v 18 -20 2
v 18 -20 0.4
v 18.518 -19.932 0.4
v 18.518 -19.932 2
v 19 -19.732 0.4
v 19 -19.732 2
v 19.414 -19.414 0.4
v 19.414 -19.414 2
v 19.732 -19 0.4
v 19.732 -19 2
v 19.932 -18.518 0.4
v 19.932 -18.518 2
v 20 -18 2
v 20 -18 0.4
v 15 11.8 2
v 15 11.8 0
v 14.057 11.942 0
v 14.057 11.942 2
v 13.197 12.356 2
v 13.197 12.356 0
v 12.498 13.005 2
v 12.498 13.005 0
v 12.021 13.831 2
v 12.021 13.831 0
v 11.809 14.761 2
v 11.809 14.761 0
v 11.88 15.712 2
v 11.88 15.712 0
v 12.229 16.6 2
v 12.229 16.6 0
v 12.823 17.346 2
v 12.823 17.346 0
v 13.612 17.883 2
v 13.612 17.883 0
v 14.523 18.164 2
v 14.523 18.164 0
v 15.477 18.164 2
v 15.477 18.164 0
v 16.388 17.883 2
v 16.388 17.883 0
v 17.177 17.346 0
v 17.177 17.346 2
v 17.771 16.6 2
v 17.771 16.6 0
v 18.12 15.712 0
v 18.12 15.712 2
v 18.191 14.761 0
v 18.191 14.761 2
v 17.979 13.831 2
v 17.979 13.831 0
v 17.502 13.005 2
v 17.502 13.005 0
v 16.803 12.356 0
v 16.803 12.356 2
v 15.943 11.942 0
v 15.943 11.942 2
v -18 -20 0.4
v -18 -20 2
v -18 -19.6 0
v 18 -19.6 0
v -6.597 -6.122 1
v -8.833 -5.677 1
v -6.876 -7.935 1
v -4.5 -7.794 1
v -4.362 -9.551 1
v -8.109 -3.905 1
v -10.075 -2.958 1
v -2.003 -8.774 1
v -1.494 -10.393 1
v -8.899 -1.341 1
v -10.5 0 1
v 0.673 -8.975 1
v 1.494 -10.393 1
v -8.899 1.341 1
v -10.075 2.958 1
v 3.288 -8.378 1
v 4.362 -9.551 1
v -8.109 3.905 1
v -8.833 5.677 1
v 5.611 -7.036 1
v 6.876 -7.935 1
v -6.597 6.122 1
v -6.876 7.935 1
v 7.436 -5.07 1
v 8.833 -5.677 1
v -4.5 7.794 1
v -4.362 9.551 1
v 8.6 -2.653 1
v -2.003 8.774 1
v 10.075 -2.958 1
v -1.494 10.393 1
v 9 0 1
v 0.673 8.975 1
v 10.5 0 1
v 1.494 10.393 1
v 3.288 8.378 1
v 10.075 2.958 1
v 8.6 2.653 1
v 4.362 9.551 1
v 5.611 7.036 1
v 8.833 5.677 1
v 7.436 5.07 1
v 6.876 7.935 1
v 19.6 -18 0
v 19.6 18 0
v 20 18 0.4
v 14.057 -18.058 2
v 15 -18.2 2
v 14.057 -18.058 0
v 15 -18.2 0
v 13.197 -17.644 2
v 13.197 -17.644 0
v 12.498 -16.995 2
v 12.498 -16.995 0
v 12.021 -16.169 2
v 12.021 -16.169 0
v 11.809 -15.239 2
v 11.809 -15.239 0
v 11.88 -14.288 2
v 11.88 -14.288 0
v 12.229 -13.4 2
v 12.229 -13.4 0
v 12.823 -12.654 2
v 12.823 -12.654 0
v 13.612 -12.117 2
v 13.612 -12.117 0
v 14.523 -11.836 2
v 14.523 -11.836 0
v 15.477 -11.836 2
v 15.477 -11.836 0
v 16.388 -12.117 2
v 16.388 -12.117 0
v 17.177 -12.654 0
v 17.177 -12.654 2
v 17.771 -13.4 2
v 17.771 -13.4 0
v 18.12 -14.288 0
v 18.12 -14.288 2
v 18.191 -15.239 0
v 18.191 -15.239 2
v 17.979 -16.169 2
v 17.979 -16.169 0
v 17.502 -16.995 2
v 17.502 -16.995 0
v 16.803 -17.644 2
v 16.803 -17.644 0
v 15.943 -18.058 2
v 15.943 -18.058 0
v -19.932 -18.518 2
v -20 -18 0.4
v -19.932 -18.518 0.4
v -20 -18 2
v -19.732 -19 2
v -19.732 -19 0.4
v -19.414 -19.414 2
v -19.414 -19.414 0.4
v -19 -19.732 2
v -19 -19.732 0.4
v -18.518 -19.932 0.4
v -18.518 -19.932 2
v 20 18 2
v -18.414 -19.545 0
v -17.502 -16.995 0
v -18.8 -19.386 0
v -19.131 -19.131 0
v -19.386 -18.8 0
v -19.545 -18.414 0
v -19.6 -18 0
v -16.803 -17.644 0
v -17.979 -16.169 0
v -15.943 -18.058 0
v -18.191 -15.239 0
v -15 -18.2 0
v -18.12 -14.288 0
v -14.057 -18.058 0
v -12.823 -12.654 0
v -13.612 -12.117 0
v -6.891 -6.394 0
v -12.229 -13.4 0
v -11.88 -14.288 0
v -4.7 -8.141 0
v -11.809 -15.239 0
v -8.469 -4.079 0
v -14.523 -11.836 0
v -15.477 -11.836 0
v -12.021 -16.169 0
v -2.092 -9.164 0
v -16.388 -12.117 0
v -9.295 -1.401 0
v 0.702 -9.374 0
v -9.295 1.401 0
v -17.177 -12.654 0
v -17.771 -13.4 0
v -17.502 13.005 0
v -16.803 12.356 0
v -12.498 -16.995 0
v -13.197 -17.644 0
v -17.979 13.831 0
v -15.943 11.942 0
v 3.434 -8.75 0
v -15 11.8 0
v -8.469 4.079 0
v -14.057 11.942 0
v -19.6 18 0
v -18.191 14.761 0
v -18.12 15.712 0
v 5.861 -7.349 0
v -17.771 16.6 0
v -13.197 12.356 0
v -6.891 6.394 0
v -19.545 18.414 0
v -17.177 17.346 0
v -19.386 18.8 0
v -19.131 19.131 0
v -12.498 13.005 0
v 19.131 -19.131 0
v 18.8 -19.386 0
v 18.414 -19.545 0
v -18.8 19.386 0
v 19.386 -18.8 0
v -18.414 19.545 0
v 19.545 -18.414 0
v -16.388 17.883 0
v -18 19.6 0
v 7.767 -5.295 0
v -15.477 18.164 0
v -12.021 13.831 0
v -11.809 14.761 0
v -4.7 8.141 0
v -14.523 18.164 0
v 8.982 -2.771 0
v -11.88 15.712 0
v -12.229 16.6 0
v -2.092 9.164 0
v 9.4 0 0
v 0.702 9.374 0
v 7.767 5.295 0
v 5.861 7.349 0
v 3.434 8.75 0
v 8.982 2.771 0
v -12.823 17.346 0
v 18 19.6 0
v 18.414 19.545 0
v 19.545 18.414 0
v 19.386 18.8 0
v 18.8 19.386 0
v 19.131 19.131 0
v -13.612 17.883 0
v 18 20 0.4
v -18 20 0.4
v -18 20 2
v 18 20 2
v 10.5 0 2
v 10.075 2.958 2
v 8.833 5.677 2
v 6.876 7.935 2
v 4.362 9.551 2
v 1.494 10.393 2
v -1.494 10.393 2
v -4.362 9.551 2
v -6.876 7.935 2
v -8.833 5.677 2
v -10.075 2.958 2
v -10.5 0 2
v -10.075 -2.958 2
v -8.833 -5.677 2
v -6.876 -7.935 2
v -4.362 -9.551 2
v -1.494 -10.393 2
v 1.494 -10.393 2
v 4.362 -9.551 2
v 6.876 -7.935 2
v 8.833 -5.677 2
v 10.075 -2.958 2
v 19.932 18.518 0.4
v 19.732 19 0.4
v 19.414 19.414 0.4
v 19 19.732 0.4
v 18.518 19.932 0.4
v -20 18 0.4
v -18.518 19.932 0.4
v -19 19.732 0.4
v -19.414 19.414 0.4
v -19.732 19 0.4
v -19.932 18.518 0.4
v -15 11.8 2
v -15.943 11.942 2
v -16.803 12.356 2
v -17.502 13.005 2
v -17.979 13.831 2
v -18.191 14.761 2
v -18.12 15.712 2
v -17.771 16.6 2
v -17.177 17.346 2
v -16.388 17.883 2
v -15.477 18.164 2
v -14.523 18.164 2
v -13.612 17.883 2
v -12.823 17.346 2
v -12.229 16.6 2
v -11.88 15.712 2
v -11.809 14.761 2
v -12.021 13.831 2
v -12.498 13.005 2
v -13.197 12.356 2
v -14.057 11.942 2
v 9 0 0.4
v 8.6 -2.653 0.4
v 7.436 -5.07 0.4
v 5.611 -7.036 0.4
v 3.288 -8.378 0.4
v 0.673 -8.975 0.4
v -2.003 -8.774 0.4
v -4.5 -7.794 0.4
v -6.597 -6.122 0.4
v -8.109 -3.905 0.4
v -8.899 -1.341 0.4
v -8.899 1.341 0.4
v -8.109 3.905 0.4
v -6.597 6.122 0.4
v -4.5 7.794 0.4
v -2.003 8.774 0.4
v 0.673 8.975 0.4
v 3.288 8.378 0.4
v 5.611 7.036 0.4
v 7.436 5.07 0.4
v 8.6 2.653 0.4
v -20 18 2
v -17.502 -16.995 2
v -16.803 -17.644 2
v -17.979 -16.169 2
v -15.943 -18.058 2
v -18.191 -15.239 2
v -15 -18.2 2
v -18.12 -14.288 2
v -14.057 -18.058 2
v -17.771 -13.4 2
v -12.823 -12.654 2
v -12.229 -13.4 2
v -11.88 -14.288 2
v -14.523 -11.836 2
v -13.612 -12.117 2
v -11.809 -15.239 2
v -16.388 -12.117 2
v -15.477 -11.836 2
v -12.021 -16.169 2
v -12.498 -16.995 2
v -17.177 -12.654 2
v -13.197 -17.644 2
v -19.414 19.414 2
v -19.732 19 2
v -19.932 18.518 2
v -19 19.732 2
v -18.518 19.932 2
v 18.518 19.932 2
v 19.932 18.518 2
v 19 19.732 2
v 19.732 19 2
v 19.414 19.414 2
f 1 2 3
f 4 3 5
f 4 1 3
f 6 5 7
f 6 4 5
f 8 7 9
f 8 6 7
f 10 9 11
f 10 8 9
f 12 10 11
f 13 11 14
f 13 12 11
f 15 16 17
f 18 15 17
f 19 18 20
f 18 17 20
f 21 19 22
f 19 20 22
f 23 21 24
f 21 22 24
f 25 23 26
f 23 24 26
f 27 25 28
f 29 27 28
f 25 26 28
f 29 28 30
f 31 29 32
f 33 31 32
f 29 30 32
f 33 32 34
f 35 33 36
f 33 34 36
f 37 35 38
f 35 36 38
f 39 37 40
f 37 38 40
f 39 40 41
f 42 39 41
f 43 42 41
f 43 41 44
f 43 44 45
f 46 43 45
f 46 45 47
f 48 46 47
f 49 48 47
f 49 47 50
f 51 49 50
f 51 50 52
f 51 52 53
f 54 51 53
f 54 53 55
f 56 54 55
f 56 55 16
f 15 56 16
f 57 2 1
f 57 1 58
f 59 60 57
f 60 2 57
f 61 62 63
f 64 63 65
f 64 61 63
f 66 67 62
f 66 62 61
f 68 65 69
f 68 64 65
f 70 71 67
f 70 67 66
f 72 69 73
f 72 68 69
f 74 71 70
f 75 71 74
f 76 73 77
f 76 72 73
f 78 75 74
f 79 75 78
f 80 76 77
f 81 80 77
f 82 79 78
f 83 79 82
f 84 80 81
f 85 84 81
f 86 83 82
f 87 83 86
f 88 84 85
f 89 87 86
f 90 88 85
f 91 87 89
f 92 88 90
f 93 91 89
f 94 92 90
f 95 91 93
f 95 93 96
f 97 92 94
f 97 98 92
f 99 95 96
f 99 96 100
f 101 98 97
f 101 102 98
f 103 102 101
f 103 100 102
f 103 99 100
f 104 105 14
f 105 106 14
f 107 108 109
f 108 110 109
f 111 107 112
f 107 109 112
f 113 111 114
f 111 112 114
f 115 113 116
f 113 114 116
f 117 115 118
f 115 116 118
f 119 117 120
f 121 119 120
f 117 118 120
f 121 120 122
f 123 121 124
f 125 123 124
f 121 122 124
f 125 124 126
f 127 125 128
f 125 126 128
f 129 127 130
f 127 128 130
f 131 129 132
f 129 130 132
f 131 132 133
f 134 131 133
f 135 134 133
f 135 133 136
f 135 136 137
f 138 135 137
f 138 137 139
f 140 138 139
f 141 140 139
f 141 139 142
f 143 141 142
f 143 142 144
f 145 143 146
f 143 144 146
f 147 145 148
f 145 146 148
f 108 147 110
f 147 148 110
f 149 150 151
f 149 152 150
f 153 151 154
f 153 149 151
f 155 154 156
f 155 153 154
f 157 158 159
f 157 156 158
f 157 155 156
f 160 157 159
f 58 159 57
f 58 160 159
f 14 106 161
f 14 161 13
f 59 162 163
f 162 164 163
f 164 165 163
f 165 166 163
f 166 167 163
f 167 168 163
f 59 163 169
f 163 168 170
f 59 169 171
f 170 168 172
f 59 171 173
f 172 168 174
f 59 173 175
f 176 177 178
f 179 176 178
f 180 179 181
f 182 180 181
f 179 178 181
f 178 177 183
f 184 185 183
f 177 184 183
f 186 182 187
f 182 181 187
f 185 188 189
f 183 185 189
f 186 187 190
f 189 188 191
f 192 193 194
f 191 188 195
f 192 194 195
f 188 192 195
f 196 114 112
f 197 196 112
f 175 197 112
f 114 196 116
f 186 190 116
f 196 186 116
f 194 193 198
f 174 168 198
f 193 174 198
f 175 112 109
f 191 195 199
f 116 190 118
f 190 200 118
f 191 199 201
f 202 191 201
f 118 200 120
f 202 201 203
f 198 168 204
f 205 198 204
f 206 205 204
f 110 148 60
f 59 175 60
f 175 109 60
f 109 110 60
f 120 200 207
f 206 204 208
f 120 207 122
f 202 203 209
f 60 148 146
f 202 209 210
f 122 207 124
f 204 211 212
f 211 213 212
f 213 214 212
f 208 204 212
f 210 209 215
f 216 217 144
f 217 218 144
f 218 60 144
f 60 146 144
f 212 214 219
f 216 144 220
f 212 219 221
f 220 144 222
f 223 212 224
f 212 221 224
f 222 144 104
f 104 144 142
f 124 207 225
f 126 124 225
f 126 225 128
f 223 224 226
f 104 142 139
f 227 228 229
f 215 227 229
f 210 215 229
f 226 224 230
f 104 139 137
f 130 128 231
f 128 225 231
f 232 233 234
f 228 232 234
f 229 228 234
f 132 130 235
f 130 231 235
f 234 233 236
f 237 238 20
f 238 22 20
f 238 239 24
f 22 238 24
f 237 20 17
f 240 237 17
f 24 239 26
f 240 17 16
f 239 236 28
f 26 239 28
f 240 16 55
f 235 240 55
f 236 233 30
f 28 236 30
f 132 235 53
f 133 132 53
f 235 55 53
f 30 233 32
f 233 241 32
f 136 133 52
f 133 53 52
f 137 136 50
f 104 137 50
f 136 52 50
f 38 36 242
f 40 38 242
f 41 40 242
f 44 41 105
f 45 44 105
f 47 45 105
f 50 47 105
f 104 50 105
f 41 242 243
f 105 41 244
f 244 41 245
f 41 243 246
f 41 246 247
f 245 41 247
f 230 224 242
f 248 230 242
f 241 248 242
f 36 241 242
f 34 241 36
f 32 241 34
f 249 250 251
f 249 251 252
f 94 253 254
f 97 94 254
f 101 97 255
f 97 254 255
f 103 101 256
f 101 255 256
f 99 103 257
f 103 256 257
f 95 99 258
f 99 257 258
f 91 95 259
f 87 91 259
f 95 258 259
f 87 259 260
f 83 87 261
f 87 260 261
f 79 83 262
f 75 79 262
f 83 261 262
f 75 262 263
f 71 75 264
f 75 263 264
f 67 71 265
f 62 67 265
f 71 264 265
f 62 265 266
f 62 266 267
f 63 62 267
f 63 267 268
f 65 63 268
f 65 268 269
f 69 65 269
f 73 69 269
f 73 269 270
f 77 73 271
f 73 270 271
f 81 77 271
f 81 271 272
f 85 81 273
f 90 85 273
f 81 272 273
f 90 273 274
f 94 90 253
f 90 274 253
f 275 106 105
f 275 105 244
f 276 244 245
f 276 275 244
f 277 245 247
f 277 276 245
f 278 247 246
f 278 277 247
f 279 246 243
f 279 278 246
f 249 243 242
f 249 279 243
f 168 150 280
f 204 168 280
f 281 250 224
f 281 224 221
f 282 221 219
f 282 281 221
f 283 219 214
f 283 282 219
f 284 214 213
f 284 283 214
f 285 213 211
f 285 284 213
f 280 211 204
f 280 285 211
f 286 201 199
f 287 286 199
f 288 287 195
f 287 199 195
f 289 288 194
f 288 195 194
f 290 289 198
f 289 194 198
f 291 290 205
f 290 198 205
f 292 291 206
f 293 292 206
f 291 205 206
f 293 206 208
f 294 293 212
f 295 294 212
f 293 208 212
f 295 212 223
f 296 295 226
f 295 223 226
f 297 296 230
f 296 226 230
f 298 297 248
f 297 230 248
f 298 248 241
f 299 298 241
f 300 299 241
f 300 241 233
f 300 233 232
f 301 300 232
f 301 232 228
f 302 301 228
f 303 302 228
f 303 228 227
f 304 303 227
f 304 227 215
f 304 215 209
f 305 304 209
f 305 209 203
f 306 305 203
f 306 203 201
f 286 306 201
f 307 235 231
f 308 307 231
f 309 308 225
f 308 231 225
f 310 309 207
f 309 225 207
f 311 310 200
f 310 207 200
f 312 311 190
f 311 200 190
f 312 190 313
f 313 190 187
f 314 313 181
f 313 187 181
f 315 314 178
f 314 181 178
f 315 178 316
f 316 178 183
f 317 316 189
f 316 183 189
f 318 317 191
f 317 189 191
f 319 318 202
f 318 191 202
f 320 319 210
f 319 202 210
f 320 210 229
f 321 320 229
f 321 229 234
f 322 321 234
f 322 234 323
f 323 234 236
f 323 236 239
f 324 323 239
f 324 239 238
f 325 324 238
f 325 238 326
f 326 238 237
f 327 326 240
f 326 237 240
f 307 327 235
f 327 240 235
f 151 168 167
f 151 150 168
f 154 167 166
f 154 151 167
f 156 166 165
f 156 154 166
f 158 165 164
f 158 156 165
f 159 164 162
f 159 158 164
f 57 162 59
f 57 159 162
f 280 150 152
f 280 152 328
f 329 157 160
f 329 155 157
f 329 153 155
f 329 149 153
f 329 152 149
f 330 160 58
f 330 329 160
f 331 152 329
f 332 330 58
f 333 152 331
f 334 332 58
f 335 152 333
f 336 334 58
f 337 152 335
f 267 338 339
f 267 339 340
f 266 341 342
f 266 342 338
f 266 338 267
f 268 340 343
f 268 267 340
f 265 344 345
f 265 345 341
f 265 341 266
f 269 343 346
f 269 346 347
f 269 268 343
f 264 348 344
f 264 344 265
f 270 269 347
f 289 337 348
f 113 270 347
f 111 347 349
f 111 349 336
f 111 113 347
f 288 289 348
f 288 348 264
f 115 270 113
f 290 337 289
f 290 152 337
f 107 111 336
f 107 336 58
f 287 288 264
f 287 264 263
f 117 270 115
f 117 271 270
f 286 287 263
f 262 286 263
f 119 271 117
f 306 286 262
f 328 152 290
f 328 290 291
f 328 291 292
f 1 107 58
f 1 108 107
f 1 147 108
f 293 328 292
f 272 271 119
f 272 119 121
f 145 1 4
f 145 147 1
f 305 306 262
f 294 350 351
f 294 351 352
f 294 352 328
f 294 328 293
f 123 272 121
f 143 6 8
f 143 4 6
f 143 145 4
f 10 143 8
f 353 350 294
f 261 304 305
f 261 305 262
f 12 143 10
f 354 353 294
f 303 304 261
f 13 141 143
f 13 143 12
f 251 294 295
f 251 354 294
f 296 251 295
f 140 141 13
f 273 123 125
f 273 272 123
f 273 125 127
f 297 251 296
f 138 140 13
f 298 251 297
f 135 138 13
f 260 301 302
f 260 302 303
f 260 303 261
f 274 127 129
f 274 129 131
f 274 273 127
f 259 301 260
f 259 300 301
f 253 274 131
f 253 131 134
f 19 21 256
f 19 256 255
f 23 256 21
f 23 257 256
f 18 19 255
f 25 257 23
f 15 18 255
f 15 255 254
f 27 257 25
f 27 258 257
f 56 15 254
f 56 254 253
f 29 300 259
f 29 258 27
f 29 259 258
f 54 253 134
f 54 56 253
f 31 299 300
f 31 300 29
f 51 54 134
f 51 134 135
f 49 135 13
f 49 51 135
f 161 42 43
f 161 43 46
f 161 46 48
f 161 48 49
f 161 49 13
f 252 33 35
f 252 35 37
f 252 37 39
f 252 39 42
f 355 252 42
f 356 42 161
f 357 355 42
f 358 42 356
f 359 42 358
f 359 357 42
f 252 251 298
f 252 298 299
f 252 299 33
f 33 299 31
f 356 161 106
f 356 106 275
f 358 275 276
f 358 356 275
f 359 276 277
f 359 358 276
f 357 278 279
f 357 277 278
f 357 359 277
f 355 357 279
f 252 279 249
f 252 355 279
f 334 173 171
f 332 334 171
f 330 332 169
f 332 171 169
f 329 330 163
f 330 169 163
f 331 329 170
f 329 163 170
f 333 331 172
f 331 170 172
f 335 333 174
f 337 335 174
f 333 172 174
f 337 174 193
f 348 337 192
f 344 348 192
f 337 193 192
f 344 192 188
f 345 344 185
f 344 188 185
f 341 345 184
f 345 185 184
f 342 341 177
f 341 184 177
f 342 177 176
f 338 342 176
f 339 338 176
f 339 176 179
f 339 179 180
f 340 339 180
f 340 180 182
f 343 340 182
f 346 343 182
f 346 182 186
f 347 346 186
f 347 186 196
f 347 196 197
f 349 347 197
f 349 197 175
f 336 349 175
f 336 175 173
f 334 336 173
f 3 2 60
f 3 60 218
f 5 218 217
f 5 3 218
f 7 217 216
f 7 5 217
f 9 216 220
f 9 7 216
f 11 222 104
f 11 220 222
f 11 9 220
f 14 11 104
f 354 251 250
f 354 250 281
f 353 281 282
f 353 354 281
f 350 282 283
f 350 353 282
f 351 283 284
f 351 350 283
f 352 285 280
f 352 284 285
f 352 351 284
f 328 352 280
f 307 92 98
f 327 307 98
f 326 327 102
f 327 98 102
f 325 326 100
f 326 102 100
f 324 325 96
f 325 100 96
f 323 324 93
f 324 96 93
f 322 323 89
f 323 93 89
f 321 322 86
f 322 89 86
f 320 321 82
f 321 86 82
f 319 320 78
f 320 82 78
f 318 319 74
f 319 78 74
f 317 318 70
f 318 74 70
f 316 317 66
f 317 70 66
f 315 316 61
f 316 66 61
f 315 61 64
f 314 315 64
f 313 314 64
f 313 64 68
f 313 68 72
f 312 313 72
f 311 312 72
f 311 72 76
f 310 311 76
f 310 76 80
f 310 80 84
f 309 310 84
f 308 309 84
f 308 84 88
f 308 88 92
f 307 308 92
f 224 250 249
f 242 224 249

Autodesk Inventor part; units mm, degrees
ref_plane "YZ Plane" through (0, 0, 0) normal (1, 0, 0) x (0, 1, 0)
ref_plane "XZ Plane" through (0, 0, 0) normal (0, 1, 0) x (-1, 0, 0)
ref_plane "XY Plane" through (0, 0, 0) normal (0, 0, 1) x (1, 0, 0)
sketch "Sketch1" plane through (0, 0, 0) normal (0, 0, 1) x (1, 0, 0)
  line L0 (-20, 20) -> (20, 20)
  line L1 (20, 20) -> (20, -20)
  line L2 (20, -20) -> (-20, -20)
  line L3 (-20, -20) -> (-20, 20)
  point P0 (0, 0)
  point P1 (20, 0)
  point P2 (0, 20)
  dimension "d0" = 40
extrude "Extrusion1" add sketch "Sketch1" along normal blind 2
fillet "Fillet1" radius 2 4 edges at (20, 20, 1) (-20, 20, 1) (20, -20, 1) (-20, -20, 1)
sketch "Sketch2" plane through (0, 0, 2) normal (0, 0, 1) x (1, 0, 0)
  line L0 (-15, 15) -> (15, 15) construction
  line L1 (15, 15) -> (15, -15) construction
  line L2 (15, -15) -> (-15, -15) construction
  line L3 (-15, -15) -> (-15, 15) construction
  point P0 (0, 0)
  point P1 (15, 0)
  point P2 (0, 15)
  dimension "d4" = 30
hole "Hole1" at (-15, 15, 2) at (15, 15, 2) at (15, -15, 2) at (-15, -15, 2) direction (0, 0, -1) diameter 6.4 end through all
sketch "Sketch3" plane through (0, 0, 2) normal (0, 0, 1) x (1, 0, 0)
  circle A0 centre (0, 0) radius 10.5
  dimension "d12" = 21
extrude "Extrusion2" cut sketch "Sketch3" against normal blind 1
sketch "Sketch4" plane through (0, 0, 1) normal (0, 0, 1) x (1, 0, 0)
  circle A0 centre (0, 0) radius 9
  dimension "d15" = 18
extrude "Extrusion3" cut sketch "Sketch4" against normal through all
chamfer "Chamfer1" distance 0.4 angle 45 9 edges at (-9, 0, 0) (0, -20, 0) (19.4142, -19.4142, 0) (20, 0, 0) (19.4142, 19.4142, 0) (0, 20, 0) (-19.4142, 19.4142, 0) (-20, 0, 0) (-19.4142, -19.4142, 0)
properties part number "RamanSampleHolder"
